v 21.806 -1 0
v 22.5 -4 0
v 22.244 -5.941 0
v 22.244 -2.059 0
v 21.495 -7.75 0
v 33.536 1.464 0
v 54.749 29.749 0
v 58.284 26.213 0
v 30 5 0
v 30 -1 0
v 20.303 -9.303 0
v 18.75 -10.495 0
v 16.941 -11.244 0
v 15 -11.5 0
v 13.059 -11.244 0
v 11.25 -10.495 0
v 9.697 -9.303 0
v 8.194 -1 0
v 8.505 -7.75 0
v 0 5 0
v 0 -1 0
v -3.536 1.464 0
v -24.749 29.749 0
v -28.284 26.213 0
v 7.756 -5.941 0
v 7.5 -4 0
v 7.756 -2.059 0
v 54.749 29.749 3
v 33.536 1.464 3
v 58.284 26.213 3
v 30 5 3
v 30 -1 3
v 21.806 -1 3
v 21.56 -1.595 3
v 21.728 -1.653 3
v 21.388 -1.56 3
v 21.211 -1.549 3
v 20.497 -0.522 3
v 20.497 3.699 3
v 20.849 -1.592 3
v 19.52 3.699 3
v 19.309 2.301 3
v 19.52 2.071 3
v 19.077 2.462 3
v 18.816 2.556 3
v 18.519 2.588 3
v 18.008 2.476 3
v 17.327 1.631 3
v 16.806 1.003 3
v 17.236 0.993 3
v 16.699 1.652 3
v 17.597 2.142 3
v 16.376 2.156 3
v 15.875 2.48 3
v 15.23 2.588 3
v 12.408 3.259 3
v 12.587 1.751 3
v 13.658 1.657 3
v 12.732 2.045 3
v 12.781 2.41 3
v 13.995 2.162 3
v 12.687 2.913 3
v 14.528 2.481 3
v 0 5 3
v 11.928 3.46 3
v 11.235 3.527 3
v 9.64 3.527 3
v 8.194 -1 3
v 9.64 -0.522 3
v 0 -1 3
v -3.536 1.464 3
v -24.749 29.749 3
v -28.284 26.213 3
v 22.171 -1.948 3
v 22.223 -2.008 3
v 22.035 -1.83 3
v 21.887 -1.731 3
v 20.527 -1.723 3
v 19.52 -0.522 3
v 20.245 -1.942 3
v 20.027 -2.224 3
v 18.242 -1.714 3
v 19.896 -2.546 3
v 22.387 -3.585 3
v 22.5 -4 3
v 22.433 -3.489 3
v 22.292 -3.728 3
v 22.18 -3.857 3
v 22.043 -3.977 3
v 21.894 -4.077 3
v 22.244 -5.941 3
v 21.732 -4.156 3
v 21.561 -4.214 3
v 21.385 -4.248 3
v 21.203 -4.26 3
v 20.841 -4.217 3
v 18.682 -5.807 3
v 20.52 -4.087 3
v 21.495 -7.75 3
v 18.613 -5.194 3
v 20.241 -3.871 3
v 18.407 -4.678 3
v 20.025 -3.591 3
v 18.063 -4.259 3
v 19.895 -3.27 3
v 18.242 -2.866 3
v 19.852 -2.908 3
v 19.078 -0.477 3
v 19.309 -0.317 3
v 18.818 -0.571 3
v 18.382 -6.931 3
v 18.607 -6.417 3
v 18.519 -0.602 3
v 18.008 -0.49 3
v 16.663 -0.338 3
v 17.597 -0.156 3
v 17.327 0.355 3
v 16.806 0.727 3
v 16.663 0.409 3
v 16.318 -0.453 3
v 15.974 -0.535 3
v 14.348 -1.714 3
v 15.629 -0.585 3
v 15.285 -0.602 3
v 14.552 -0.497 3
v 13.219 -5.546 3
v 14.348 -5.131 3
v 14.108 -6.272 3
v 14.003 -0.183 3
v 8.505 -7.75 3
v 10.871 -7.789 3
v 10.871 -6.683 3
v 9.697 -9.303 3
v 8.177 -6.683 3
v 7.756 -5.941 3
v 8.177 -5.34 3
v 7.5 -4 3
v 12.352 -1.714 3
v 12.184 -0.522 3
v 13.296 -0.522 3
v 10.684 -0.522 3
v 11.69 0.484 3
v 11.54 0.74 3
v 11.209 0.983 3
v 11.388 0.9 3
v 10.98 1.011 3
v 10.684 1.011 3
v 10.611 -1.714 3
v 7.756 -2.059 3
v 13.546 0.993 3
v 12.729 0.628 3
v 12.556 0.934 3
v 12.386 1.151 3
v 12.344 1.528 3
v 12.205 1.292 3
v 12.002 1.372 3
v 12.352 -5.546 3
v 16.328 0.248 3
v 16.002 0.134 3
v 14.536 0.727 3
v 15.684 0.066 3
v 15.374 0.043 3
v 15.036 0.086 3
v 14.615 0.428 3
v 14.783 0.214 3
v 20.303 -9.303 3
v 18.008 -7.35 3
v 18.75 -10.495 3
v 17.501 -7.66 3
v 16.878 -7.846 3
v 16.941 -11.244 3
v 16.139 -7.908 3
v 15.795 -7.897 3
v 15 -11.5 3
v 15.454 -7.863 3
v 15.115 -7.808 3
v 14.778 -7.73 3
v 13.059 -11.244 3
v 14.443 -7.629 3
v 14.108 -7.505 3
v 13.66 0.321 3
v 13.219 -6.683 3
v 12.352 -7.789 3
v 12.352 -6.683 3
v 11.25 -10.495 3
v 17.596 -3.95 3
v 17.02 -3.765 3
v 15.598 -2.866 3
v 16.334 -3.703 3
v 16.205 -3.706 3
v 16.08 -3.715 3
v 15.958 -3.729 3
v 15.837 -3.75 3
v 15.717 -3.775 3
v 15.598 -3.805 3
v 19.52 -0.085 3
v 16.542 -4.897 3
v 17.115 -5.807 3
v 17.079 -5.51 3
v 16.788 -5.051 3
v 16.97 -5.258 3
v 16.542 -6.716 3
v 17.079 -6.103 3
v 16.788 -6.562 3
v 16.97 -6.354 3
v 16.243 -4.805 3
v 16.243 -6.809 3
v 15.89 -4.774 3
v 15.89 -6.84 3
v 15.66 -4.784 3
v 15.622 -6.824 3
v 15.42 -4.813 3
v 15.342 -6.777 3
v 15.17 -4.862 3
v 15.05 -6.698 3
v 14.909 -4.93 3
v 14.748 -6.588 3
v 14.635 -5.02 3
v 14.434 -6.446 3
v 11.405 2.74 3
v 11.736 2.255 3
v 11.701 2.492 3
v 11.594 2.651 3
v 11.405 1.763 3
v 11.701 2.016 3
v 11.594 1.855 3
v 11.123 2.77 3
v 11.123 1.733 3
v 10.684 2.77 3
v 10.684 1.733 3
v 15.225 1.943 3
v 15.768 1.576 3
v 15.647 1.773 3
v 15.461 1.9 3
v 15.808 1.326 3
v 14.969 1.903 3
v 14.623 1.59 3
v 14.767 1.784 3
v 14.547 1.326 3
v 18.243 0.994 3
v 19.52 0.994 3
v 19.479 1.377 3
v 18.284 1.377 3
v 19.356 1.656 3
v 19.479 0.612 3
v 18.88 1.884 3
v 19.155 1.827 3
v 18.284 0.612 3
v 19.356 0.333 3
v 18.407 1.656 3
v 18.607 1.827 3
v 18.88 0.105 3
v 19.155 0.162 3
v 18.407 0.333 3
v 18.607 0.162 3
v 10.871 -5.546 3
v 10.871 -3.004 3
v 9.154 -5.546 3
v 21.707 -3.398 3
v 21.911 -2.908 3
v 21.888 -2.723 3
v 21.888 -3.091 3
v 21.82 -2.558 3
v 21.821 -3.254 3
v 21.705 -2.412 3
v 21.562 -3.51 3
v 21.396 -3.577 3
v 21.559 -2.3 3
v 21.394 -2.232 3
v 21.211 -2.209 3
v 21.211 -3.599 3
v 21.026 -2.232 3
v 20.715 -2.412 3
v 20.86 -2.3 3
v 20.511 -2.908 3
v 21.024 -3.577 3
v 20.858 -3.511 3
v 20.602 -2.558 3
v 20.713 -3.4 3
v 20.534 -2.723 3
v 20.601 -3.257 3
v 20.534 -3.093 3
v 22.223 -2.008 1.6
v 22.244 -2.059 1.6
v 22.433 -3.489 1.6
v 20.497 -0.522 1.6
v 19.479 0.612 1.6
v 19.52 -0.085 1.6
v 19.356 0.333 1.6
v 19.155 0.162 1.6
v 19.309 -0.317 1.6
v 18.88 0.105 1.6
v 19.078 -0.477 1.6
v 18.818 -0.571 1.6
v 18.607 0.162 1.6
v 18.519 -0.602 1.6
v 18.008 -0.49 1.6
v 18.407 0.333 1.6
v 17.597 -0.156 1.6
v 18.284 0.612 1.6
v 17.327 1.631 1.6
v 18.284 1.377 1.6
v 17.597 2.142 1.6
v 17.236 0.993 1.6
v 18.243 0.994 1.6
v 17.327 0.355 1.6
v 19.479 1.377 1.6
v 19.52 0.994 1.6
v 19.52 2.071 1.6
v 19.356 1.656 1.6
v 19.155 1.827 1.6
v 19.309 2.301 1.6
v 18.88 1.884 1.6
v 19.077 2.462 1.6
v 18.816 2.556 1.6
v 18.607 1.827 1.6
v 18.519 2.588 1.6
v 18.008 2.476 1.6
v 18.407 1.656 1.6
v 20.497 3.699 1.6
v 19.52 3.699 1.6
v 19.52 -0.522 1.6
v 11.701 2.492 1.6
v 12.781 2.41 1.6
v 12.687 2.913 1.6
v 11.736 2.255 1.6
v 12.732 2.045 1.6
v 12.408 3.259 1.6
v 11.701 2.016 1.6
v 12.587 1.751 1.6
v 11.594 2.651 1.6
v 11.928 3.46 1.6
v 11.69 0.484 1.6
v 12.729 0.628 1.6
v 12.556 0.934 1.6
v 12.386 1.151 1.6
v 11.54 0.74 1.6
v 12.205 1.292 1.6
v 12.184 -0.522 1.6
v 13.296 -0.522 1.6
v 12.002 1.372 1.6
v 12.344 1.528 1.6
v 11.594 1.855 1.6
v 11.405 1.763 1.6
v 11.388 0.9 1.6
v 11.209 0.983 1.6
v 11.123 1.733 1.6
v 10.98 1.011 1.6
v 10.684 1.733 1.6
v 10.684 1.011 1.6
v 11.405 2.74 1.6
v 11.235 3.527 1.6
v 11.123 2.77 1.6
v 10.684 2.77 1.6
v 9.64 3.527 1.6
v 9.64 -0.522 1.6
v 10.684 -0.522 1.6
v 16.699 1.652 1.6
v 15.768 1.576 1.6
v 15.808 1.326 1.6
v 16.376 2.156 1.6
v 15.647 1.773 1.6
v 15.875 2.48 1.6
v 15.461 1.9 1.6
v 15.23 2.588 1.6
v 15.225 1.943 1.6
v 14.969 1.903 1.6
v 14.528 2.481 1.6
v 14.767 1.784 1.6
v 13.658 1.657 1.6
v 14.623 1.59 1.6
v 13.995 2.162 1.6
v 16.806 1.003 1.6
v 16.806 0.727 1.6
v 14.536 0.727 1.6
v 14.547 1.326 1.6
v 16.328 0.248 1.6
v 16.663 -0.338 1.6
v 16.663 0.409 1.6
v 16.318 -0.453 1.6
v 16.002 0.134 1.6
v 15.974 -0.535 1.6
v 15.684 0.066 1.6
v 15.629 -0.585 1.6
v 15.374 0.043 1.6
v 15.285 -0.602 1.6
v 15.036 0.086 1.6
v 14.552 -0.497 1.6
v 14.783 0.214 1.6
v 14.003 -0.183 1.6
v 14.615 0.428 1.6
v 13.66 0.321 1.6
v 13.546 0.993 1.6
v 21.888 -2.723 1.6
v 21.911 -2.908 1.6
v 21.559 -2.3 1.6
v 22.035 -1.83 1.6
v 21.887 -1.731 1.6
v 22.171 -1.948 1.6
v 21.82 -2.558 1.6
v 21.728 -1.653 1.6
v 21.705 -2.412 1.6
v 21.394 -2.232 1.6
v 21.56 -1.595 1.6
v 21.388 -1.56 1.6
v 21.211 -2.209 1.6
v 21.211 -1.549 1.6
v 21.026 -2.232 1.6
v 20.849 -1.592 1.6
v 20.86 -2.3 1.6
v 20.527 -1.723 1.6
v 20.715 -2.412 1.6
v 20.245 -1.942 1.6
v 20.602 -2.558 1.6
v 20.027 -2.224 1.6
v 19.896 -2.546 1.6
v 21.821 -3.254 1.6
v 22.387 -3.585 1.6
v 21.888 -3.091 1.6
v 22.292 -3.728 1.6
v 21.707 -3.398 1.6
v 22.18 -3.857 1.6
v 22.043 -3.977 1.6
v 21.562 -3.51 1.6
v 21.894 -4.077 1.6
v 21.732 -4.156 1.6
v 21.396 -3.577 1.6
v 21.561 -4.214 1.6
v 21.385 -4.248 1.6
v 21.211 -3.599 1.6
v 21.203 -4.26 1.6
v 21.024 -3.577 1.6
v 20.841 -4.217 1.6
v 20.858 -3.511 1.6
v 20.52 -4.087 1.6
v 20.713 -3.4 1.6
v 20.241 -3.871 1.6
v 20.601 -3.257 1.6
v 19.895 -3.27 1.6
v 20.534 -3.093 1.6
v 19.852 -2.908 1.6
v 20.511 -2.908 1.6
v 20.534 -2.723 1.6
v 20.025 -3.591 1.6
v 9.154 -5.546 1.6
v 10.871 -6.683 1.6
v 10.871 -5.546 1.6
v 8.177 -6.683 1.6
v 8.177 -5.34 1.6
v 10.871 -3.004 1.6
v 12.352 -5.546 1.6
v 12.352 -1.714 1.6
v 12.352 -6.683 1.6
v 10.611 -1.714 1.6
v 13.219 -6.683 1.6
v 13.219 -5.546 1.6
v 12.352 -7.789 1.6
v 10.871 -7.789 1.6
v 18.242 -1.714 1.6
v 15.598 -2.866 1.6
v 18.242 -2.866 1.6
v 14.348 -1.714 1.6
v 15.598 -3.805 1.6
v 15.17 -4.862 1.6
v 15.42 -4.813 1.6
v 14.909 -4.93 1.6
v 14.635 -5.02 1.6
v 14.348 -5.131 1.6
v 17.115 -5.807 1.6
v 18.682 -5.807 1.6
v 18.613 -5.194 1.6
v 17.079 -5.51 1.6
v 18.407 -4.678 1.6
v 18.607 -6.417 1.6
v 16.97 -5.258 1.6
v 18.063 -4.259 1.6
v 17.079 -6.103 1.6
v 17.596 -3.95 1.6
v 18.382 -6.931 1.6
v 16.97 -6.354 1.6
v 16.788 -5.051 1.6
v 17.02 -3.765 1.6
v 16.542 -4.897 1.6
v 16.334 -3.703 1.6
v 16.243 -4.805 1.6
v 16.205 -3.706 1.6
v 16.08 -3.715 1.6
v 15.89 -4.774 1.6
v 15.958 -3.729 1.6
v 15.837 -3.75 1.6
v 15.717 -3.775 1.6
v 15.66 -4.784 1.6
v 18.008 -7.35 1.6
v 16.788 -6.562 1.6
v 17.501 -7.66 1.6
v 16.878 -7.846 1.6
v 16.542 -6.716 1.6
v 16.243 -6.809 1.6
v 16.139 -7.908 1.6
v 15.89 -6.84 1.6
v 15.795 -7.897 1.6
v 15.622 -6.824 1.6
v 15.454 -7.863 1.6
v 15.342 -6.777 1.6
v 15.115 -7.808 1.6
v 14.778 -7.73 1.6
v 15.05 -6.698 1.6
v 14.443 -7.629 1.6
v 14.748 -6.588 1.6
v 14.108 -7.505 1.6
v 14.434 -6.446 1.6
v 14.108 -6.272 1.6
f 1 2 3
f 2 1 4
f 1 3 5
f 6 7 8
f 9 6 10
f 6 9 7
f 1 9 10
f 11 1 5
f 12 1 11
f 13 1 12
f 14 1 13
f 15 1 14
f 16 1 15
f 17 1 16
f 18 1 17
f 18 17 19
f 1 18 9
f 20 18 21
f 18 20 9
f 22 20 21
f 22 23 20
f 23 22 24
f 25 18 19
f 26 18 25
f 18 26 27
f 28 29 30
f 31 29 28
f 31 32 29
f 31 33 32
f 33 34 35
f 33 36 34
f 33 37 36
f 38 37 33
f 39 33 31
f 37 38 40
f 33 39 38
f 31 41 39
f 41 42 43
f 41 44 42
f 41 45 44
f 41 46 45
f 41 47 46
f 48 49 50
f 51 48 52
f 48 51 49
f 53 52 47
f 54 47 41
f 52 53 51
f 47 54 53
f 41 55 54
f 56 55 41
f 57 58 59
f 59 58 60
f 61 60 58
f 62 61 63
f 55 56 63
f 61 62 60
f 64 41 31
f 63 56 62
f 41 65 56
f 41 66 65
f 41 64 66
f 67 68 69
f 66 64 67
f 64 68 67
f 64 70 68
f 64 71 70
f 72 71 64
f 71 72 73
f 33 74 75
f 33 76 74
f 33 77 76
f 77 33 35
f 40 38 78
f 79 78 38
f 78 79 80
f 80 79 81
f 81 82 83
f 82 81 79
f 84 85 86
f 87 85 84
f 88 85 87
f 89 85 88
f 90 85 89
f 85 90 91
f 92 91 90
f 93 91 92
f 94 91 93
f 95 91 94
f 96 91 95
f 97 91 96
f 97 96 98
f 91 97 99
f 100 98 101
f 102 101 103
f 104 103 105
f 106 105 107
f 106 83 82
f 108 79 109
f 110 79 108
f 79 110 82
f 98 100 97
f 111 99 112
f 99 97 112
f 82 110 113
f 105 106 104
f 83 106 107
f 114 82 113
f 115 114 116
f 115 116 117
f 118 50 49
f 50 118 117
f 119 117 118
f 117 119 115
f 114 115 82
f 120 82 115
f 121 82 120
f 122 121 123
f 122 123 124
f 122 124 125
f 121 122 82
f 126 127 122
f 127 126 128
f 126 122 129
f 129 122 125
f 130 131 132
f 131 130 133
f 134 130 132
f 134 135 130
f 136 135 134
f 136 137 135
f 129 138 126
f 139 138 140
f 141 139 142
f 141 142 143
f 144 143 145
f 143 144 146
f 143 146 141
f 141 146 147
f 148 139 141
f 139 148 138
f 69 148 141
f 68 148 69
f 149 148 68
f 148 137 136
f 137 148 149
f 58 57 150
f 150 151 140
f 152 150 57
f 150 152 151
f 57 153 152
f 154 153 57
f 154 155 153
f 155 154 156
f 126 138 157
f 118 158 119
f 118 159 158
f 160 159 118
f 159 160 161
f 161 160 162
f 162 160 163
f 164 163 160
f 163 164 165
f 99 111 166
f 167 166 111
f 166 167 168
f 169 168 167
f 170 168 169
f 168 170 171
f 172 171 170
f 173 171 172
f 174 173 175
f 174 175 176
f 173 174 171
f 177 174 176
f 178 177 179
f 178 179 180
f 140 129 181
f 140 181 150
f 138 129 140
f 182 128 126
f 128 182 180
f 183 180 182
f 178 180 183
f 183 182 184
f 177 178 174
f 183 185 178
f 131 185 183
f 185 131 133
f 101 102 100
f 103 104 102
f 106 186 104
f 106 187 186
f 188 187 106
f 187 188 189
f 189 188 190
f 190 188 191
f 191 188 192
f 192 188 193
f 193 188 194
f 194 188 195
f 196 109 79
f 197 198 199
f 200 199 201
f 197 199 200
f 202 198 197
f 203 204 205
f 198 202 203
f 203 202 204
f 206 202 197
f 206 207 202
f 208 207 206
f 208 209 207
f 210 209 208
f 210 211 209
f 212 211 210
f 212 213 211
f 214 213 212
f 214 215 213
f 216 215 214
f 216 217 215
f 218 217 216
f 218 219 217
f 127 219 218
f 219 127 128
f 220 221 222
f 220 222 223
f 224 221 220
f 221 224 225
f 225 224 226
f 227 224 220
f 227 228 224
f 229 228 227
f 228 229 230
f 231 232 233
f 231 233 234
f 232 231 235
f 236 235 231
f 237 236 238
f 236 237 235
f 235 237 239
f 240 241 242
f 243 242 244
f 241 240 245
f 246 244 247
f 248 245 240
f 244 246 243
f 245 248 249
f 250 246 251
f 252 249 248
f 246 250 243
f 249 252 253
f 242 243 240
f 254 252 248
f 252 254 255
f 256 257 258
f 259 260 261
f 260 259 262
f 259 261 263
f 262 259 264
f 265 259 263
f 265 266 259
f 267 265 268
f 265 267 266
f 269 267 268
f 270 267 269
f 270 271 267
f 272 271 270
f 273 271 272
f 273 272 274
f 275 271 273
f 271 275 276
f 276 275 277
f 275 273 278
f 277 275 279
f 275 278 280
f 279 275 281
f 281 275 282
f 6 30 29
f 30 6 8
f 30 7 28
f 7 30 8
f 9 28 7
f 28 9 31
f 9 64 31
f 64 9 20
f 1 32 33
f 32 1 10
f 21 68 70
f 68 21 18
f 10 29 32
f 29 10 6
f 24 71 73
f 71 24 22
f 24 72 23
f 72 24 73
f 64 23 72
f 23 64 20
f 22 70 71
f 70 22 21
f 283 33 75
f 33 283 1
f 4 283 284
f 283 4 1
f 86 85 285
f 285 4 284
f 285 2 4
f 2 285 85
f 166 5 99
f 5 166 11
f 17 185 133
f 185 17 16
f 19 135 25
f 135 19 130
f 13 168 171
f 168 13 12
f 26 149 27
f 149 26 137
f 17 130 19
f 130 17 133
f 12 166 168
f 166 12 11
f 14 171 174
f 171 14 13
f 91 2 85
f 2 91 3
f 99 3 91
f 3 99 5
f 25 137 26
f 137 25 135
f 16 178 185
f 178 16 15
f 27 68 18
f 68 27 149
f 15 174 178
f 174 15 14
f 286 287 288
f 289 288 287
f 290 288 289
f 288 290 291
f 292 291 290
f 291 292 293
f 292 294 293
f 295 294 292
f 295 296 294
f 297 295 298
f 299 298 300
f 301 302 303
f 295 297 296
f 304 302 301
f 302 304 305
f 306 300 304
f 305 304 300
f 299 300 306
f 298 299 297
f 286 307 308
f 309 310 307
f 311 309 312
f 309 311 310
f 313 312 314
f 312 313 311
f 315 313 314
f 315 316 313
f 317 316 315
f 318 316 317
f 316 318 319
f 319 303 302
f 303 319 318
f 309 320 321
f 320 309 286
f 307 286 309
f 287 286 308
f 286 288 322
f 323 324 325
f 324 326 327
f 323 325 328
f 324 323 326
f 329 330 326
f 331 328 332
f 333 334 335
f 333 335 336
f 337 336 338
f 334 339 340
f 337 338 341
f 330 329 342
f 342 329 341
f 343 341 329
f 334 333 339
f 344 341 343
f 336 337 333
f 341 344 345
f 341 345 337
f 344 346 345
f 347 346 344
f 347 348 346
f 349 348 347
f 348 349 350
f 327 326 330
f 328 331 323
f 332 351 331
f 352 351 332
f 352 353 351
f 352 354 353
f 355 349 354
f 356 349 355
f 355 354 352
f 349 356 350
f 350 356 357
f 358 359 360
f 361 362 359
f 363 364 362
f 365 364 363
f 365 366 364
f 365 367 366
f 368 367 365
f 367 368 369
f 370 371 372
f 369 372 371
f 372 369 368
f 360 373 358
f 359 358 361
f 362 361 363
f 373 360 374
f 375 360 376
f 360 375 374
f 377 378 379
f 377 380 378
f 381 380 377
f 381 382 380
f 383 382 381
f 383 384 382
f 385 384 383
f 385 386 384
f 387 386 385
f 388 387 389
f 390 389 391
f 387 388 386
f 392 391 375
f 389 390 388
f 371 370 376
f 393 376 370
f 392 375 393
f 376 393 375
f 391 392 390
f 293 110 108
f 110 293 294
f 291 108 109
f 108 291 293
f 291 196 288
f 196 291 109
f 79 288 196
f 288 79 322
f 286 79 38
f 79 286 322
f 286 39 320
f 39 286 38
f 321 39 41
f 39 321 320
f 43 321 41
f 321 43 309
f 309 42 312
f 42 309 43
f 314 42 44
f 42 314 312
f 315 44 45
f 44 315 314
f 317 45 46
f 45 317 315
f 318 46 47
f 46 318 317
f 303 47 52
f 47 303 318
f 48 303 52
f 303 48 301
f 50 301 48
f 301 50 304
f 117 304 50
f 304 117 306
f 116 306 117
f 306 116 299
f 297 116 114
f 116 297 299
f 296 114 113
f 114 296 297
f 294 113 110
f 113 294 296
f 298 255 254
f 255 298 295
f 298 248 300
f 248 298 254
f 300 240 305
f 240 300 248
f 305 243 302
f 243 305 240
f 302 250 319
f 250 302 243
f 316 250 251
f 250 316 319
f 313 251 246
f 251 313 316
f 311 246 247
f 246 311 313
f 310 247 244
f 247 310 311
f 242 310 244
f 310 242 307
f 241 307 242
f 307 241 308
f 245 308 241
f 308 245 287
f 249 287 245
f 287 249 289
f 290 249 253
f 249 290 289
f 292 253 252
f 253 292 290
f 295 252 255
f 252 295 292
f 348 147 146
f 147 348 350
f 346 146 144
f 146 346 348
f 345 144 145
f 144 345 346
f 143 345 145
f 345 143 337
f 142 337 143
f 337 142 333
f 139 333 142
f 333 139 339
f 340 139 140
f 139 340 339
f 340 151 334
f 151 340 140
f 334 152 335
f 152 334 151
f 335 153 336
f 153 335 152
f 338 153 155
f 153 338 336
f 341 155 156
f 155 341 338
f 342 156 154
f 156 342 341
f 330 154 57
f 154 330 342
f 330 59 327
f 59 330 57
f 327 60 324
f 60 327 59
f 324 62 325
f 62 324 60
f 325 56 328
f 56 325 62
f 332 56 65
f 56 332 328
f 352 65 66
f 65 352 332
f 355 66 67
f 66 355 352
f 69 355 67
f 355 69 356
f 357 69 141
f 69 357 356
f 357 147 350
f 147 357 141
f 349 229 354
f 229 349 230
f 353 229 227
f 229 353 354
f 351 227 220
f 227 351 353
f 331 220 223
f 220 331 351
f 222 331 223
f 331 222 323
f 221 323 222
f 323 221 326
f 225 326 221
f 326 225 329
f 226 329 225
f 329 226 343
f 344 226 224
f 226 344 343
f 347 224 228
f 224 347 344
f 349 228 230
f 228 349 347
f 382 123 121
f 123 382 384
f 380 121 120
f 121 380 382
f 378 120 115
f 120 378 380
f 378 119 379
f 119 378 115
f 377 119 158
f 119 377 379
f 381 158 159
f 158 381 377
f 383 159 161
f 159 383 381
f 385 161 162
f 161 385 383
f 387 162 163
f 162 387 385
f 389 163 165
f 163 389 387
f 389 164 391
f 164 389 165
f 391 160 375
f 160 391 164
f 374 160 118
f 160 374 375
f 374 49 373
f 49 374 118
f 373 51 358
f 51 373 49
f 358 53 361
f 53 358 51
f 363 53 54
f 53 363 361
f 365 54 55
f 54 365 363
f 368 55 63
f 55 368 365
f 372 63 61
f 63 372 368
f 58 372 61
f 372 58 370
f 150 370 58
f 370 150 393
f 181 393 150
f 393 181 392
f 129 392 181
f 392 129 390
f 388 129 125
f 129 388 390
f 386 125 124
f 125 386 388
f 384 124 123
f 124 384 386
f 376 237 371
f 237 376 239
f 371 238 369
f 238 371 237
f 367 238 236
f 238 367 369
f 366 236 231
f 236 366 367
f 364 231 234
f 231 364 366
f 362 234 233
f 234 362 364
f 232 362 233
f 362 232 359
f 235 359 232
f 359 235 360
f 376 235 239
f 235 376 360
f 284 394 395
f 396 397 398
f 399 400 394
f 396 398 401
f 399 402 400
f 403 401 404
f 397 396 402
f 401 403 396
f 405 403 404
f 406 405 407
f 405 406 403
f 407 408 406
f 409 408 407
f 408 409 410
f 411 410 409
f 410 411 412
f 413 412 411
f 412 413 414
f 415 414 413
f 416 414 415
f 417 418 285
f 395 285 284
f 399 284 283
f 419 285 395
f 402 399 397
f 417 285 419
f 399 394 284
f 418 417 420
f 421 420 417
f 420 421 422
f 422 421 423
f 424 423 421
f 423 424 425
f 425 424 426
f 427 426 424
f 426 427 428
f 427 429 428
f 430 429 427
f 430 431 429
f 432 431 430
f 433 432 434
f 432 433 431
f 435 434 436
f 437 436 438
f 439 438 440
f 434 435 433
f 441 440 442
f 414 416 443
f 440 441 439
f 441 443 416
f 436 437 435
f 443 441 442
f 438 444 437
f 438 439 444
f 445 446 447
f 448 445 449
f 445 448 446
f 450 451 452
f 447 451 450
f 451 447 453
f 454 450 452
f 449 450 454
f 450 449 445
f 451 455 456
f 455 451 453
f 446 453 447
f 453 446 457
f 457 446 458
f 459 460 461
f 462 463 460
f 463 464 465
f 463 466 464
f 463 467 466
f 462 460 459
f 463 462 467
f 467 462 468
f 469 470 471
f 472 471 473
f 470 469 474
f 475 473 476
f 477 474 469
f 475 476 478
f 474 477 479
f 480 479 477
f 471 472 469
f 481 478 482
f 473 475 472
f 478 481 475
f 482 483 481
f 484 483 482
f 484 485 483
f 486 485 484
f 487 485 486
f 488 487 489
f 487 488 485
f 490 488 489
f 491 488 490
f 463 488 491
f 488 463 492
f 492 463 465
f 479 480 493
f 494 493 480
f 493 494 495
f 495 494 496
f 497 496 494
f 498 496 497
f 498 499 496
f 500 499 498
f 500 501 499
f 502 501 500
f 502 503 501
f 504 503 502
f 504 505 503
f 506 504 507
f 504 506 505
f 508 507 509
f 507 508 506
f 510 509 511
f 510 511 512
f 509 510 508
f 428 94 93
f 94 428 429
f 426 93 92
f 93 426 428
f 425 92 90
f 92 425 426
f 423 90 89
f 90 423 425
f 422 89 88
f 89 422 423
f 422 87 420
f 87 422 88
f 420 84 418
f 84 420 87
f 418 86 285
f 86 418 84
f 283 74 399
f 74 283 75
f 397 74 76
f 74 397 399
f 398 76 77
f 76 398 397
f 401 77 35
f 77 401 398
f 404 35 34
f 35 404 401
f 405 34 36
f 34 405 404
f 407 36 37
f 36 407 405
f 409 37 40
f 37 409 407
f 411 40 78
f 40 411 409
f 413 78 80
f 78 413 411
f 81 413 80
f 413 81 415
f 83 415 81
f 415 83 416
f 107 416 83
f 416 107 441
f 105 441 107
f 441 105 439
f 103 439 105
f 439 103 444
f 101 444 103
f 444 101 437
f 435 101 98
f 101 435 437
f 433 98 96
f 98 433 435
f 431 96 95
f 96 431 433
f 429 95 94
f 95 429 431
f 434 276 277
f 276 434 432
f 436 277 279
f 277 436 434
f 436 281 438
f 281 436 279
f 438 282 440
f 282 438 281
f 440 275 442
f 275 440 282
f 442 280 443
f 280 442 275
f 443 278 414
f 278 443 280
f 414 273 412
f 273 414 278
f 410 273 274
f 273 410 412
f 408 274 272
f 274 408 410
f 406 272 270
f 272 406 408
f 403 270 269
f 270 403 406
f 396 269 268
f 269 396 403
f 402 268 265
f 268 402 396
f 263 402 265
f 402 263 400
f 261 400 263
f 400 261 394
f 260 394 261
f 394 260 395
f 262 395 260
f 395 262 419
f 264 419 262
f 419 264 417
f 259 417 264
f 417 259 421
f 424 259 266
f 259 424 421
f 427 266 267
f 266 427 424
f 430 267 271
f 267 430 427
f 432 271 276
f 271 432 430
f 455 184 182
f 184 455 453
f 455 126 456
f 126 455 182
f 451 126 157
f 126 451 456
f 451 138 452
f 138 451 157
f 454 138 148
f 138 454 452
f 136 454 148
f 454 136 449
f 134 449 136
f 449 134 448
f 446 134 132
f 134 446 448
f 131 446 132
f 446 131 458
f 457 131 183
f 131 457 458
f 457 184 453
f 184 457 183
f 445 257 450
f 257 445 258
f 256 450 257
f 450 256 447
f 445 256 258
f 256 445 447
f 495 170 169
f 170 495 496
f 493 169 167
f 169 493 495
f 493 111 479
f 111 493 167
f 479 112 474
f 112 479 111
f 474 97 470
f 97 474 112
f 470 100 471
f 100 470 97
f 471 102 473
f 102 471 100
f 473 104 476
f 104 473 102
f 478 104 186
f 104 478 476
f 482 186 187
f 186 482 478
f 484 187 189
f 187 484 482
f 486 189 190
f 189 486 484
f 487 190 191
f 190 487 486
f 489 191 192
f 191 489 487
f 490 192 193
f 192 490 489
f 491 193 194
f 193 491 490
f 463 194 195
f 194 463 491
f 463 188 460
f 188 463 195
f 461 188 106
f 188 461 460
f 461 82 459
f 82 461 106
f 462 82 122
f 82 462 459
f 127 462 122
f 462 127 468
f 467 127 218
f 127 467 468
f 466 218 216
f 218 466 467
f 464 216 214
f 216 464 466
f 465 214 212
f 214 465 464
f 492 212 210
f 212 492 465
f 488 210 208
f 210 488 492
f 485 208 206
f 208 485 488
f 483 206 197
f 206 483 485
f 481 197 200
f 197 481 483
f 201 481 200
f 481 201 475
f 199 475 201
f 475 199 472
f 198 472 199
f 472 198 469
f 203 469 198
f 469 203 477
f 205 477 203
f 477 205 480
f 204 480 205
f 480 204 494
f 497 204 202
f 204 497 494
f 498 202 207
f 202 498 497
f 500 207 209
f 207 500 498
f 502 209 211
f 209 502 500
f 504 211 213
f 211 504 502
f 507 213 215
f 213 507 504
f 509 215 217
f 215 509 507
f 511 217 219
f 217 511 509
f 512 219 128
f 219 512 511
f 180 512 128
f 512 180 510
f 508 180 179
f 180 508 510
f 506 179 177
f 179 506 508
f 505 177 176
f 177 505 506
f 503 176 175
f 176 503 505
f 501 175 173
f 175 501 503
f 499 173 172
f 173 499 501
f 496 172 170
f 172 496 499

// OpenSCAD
// Armada 45 degree turn template

turnAngle = 45.00 ;

baseWidth=30.00 ; height=3.00 ;
armLength = 35.00;
baseDepth = 5.00 ;

points = [[0,baseDepth],[baseWidth,baseDepth]
         ,[baseWidth+armLength*sin(turnAngle), baseDepth+armLength*cos(turnAngle)]
         ,[baseWidth+armLength*sin(turnAngle)+baseDepth*cos(turnAngle), baseDepth+armLength*cos(turnAngle) - baseDepth*sin(turnAngle) ]
         ,[baseWidth+baseDepth*cos(turnAngle), baseDepth - baseDepth*sin(turnAngle) ]
         ,[baseWidth,-1.00], [0,-1.00]
] ;

difference() {
   union() {
            linear_extrude(height=height) polygon(points);
            translate([baseWidth,0,0])mirror([1,0,0])linear_extrude(height=height) polygon(points);
            // Add finger tab
            translate([baseWidth/2,-4,0]) cylinder(r=7.5,h=height) ;
    }

    translate([baseWidth/2,baseDepth/2-1,1.6])
       linear_extrude(height=2.0)
          text("Red", font="Arial Nova:style=Bold",size=4, valign="center", halign="center");

    translate([baseWidth/2+.5,-4.8,1.6])
       linear_extrude(height=1.5)
          text("45°", size=6, font="Arial Nova:style=Bold", valign="center", halign="center");
}
